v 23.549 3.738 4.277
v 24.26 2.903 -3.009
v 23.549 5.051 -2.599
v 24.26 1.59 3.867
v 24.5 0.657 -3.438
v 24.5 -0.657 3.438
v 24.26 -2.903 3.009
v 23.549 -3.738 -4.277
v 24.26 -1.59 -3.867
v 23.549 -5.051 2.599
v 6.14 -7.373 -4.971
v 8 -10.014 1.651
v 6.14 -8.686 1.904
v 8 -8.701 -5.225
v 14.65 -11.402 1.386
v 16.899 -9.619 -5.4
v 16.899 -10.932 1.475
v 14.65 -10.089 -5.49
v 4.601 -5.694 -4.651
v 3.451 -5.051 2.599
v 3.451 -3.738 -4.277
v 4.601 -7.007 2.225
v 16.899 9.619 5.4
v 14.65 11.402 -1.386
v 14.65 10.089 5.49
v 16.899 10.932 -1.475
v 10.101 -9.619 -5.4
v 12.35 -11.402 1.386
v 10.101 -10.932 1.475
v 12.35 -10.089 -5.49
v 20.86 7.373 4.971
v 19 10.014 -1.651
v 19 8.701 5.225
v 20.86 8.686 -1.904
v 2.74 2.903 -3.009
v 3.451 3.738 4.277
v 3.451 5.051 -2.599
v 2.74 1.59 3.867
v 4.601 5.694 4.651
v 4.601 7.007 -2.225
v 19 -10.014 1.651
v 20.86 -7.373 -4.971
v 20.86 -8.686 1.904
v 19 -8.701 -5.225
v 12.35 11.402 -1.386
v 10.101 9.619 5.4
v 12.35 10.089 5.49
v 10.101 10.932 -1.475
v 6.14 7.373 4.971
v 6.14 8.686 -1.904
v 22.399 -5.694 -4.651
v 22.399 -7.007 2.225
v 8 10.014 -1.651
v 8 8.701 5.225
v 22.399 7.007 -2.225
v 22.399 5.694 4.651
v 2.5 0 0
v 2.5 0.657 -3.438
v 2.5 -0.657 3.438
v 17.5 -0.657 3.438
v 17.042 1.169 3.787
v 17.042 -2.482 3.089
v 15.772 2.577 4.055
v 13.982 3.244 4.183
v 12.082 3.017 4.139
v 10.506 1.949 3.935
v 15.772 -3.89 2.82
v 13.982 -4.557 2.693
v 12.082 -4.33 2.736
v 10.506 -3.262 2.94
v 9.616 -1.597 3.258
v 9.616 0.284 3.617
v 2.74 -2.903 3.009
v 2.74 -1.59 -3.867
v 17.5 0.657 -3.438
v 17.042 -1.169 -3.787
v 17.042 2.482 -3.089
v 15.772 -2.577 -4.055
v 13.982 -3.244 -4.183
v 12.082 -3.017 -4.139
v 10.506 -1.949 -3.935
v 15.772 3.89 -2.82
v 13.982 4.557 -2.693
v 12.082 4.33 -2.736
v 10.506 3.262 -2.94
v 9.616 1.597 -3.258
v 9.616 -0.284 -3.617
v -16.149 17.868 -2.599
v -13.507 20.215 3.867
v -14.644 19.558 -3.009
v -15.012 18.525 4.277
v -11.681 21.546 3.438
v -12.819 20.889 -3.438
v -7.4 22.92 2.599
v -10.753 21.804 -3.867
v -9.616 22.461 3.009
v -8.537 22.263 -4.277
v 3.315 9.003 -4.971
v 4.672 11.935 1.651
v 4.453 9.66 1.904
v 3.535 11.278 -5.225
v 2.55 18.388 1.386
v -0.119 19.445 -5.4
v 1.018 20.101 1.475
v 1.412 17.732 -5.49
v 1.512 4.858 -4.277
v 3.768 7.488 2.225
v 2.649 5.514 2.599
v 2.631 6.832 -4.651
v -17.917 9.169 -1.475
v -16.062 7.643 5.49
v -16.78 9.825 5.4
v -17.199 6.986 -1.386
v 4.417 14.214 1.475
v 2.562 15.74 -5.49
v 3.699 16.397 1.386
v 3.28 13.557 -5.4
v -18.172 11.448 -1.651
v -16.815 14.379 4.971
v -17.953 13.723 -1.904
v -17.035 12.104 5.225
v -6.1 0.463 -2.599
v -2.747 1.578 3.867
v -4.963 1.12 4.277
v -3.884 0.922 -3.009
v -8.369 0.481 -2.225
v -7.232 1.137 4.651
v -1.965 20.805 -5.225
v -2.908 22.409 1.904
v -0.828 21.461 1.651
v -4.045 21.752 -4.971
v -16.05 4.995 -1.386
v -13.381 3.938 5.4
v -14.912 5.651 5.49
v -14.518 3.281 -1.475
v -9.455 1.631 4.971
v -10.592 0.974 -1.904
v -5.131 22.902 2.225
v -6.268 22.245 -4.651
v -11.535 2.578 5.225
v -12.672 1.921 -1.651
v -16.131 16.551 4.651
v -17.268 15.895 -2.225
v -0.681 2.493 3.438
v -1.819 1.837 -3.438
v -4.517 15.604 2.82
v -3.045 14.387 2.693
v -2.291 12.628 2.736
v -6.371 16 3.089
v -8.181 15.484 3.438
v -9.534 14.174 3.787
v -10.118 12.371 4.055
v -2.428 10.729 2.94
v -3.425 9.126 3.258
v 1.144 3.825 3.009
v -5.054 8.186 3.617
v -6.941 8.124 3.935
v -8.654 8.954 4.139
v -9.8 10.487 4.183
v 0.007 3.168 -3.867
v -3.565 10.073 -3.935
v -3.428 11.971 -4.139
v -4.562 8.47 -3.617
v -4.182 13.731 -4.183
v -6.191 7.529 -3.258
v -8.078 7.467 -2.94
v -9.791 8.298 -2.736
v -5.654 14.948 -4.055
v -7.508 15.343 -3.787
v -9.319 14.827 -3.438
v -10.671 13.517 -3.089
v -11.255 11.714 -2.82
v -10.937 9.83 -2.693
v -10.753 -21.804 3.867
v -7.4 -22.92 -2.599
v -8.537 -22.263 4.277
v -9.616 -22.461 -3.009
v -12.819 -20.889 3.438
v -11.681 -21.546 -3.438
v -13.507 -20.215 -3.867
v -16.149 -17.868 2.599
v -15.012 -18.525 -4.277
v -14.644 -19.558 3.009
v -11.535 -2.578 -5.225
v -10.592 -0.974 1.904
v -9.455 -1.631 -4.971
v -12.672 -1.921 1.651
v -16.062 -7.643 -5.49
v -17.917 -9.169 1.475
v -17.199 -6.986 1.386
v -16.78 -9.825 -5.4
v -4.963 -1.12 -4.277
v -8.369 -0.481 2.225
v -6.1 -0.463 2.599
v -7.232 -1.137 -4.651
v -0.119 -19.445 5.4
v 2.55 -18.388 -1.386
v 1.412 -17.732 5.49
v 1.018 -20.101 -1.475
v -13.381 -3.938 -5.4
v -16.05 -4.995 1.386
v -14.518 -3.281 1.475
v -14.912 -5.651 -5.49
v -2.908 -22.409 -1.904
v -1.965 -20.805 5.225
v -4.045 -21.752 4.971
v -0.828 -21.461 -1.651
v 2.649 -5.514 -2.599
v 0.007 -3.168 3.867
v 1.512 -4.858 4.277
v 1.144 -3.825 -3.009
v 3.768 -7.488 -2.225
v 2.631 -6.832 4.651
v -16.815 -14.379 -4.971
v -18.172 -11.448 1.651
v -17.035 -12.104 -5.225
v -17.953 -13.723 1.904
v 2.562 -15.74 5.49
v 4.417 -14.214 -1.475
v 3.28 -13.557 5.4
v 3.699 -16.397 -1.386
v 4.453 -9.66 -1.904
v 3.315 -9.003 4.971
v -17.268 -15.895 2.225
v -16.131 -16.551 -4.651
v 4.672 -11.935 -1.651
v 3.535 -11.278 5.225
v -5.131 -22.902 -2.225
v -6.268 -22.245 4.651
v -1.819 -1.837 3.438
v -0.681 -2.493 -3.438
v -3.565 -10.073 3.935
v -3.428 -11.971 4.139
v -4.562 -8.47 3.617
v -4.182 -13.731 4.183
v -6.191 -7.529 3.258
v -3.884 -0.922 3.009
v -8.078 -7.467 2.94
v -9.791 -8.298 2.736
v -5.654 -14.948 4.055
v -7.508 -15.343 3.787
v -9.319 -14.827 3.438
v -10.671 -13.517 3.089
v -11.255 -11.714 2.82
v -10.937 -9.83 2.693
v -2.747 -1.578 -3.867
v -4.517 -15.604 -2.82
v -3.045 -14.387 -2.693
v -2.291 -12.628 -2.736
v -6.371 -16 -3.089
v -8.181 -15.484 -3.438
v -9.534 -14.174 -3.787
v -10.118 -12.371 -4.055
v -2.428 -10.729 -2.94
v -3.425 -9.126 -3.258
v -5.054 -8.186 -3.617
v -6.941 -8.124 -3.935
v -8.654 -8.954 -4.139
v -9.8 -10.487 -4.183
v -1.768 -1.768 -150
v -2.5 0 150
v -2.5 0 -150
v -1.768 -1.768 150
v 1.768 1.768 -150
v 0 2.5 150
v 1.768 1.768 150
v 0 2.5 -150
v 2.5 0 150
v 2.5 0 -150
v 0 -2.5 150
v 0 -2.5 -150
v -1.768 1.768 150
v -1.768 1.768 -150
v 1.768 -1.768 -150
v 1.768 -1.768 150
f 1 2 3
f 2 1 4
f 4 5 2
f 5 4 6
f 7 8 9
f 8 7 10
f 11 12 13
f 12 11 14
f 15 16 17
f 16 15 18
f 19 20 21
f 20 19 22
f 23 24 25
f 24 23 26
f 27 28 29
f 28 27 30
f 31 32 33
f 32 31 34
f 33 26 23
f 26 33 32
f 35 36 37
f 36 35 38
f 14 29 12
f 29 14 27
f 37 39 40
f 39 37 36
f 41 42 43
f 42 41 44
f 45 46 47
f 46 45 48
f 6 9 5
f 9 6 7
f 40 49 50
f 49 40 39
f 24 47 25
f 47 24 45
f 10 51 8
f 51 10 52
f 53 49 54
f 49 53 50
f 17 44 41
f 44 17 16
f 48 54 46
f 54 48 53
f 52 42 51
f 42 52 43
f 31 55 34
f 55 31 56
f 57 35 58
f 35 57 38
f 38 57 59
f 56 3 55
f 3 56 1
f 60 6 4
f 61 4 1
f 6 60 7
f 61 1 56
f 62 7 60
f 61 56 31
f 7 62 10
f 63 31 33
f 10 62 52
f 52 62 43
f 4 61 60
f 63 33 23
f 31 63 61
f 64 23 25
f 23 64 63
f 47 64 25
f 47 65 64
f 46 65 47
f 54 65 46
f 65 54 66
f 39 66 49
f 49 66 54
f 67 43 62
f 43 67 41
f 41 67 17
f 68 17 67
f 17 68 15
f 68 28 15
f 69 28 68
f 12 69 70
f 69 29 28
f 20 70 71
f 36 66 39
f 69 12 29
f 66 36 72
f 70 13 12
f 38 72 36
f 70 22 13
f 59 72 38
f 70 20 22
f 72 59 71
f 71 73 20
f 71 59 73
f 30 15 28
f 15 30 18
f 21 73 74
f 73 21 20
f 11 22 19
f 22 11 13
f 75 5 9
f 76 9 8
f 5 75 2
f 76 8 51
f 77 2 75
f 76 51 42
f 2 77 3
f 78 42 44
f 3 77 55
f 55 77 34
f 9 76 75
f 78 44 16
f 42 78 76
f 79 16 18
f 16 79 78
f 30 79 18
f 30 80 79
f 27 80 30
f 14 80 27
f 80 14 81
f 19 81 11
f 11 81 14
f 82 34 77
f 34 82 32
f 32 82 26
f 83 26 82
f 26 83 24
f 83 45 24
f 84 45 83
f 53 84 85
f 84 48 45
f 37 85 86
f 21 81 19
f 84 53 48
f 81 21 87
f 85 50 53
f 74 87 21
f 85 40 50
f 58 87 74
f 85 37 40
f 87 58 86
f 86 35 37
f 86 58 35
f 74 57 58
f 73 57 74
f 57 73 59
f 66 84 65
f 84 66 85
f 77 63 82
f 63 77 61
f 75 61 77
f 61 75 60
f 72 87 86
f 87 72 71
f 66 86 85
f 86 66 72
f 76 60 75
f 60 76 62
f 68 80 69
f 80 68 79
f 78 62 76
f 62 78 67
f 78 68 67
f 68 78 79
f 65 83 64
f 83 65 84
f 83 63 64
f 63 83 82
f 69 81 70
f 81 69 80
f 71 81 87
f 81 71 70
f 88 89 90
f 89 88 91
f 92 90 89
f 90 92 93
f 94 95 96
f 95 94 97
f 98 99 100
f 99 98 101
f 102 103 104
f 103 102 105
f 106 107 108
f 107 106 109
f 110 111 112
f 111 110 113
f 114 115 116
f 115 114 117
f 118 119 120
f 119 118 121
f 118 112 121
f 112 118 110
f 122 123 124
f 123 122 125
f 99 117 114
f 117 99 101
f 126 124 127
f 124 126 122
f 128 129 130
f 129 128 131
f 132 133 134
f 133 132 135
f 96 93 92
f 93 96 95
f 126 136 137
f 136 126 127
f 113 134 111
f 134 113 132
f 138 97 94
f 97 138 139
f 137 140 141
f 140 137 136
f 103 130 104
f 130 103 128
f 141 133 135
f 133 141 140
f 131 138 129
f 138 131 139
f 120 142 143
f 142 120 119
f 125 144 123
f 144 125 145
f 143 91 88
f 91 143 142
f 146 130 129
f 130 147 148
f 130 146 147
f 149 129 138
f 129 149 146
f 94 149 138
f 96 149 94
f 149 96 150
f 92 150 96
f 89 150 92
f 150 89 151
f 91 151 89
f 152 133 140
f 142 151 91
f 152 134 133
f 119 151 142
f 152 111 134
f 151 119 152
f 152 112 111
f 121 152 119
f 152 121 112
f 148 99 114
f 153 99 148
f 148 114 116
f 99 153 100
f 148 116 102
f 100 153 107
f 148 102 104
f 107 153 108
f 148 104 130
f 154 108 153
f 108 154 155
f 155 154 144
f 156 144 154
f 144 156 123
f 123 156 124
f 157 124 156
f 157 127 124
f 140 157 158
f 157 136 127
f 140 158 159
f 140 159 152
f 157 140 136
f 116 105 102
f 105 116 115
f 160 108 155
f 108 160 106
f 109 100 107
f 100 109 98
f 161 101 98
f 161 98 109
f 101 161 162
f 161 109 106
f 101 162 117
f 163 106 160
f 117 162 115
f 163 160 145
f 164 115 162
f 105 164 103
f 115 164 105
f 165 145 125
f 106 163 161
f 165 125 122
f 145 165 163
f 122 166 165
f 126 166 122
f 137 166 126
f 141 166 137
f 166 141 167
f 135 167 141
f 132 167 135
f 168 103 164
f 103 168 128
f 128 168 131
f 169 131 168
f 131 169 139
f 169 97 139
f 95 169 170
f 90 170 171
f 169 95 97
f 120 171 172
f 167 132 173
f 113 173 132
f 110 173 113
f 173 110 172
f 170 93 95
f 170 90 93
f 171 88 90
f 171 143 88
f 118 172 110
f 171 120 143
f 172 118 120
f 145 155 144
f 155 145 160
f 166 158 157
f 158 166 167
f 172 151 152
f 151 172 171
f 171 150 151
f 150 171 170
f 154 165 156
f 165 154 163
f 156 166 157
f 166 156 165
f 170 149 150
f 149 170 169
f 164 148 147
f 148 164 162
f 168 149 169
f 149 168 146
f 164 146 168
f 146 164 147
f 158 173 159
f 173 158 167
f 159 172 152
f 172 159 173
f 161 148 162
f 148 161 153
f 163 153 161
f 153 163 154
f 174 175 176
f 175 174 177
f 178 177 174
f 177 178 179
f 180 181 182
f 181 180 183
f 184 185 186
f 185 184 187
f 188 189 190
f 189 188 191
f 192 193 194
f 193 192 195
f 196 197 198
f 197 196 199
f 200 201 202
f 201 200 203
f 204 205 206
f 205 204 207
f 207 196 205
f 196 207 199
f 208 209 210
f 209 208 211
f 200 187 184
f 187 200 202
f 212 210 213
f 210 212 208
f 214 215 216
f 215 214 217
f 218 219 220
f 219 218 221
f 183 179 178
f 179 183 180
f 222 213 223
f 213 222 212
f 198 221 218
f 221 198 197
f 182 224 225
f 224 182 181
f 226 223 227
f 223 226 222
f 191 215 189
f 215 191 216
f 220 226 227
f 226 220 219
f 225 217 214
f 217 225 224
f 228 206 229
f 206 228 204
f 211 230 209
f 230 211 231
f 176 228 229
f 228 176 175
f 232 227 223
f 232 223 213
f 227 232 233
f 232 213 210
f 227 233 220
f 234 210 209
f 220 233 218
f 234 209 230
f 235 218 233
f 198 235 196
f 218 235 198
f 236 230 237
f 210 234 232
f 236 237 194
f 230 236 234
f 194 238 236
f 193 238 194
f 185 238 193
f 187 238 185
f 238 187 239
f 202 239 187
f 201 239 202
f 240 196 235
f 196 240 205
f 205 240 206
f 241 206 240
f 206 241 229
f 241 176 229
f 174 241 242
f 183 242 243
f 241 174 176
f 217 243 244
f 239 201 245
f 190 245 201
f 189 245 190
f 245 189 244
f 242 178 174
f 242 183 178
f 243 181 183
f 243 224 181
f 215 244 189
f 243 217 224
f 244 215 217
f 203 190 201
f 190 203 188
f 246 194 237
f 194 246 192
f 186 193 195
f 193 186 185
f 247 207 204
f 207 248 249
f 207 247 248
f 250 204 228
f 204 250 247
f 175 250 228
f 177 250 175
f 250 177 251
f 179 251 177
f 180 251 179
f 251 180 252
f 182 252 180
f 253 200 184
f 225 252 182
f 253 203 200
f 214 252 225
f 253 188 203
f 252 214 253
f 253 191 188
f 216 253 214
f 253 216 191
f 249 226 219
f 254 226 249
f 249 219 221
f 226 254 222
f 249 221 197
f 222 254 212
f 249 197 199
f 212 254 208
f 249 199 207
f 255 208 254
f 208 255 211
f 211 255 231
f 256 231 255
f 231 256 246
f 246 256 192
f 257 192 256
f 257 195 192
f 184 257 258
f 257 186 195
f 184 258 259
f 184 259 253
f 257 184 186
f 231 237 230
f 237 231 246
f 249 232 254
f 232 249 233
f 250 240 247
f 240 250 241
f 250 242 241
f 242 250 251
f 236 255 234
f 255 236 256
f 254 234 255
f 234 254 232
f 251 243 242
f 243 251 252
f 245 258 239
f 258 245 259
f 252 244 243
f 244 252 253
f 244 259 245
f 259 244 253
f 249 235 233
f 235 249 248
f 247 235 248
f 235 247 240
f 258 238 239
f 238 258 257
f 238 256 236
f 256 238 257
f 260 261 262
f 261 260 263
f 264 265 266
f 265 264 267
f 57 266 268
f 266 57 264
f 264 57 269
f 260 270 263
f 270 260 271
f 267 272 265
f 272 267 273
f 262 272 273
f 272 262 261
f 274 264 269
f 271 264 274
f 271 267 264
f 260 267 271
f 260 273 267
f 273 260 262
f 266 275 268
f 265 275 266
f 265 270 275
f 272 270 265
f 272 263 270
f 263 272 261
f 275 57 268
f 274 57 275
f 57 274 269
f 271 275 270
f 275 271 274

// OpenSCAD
rod_diameter = 5;
bearing_od = 22;
bearing_id = 8;
bearing_width = 7;
thread_pitch = 3;
rod_length=300;

//module rod(diameter=rod_diameter, length=rod_length)
//nvm that's just a cylinder

module bearing(od=bearing_od, id=bearing_id, width=bearing_width,center=false){
    difference(){
        cylinder(d=od,h=width, center=center);
        translate([0,0,(center? 0: -.1)]) cylinder(d=id,h=width+.2, center=center);
    }
}

//bearing();
module demo(){
    twist = atan2(thread_pitch, rod_diameter*PI);
    for(azimuth=[0,120,240]){
        rotate([0,0,azimuth])
            translate([bearing_od/2+rod_diameter/2,0,0])
            rotate([twist,0,0])
            bearing(center=true);
    }
    #cylinder(d=rod_diameter, h=rod_length, center=true);
}


demo();
